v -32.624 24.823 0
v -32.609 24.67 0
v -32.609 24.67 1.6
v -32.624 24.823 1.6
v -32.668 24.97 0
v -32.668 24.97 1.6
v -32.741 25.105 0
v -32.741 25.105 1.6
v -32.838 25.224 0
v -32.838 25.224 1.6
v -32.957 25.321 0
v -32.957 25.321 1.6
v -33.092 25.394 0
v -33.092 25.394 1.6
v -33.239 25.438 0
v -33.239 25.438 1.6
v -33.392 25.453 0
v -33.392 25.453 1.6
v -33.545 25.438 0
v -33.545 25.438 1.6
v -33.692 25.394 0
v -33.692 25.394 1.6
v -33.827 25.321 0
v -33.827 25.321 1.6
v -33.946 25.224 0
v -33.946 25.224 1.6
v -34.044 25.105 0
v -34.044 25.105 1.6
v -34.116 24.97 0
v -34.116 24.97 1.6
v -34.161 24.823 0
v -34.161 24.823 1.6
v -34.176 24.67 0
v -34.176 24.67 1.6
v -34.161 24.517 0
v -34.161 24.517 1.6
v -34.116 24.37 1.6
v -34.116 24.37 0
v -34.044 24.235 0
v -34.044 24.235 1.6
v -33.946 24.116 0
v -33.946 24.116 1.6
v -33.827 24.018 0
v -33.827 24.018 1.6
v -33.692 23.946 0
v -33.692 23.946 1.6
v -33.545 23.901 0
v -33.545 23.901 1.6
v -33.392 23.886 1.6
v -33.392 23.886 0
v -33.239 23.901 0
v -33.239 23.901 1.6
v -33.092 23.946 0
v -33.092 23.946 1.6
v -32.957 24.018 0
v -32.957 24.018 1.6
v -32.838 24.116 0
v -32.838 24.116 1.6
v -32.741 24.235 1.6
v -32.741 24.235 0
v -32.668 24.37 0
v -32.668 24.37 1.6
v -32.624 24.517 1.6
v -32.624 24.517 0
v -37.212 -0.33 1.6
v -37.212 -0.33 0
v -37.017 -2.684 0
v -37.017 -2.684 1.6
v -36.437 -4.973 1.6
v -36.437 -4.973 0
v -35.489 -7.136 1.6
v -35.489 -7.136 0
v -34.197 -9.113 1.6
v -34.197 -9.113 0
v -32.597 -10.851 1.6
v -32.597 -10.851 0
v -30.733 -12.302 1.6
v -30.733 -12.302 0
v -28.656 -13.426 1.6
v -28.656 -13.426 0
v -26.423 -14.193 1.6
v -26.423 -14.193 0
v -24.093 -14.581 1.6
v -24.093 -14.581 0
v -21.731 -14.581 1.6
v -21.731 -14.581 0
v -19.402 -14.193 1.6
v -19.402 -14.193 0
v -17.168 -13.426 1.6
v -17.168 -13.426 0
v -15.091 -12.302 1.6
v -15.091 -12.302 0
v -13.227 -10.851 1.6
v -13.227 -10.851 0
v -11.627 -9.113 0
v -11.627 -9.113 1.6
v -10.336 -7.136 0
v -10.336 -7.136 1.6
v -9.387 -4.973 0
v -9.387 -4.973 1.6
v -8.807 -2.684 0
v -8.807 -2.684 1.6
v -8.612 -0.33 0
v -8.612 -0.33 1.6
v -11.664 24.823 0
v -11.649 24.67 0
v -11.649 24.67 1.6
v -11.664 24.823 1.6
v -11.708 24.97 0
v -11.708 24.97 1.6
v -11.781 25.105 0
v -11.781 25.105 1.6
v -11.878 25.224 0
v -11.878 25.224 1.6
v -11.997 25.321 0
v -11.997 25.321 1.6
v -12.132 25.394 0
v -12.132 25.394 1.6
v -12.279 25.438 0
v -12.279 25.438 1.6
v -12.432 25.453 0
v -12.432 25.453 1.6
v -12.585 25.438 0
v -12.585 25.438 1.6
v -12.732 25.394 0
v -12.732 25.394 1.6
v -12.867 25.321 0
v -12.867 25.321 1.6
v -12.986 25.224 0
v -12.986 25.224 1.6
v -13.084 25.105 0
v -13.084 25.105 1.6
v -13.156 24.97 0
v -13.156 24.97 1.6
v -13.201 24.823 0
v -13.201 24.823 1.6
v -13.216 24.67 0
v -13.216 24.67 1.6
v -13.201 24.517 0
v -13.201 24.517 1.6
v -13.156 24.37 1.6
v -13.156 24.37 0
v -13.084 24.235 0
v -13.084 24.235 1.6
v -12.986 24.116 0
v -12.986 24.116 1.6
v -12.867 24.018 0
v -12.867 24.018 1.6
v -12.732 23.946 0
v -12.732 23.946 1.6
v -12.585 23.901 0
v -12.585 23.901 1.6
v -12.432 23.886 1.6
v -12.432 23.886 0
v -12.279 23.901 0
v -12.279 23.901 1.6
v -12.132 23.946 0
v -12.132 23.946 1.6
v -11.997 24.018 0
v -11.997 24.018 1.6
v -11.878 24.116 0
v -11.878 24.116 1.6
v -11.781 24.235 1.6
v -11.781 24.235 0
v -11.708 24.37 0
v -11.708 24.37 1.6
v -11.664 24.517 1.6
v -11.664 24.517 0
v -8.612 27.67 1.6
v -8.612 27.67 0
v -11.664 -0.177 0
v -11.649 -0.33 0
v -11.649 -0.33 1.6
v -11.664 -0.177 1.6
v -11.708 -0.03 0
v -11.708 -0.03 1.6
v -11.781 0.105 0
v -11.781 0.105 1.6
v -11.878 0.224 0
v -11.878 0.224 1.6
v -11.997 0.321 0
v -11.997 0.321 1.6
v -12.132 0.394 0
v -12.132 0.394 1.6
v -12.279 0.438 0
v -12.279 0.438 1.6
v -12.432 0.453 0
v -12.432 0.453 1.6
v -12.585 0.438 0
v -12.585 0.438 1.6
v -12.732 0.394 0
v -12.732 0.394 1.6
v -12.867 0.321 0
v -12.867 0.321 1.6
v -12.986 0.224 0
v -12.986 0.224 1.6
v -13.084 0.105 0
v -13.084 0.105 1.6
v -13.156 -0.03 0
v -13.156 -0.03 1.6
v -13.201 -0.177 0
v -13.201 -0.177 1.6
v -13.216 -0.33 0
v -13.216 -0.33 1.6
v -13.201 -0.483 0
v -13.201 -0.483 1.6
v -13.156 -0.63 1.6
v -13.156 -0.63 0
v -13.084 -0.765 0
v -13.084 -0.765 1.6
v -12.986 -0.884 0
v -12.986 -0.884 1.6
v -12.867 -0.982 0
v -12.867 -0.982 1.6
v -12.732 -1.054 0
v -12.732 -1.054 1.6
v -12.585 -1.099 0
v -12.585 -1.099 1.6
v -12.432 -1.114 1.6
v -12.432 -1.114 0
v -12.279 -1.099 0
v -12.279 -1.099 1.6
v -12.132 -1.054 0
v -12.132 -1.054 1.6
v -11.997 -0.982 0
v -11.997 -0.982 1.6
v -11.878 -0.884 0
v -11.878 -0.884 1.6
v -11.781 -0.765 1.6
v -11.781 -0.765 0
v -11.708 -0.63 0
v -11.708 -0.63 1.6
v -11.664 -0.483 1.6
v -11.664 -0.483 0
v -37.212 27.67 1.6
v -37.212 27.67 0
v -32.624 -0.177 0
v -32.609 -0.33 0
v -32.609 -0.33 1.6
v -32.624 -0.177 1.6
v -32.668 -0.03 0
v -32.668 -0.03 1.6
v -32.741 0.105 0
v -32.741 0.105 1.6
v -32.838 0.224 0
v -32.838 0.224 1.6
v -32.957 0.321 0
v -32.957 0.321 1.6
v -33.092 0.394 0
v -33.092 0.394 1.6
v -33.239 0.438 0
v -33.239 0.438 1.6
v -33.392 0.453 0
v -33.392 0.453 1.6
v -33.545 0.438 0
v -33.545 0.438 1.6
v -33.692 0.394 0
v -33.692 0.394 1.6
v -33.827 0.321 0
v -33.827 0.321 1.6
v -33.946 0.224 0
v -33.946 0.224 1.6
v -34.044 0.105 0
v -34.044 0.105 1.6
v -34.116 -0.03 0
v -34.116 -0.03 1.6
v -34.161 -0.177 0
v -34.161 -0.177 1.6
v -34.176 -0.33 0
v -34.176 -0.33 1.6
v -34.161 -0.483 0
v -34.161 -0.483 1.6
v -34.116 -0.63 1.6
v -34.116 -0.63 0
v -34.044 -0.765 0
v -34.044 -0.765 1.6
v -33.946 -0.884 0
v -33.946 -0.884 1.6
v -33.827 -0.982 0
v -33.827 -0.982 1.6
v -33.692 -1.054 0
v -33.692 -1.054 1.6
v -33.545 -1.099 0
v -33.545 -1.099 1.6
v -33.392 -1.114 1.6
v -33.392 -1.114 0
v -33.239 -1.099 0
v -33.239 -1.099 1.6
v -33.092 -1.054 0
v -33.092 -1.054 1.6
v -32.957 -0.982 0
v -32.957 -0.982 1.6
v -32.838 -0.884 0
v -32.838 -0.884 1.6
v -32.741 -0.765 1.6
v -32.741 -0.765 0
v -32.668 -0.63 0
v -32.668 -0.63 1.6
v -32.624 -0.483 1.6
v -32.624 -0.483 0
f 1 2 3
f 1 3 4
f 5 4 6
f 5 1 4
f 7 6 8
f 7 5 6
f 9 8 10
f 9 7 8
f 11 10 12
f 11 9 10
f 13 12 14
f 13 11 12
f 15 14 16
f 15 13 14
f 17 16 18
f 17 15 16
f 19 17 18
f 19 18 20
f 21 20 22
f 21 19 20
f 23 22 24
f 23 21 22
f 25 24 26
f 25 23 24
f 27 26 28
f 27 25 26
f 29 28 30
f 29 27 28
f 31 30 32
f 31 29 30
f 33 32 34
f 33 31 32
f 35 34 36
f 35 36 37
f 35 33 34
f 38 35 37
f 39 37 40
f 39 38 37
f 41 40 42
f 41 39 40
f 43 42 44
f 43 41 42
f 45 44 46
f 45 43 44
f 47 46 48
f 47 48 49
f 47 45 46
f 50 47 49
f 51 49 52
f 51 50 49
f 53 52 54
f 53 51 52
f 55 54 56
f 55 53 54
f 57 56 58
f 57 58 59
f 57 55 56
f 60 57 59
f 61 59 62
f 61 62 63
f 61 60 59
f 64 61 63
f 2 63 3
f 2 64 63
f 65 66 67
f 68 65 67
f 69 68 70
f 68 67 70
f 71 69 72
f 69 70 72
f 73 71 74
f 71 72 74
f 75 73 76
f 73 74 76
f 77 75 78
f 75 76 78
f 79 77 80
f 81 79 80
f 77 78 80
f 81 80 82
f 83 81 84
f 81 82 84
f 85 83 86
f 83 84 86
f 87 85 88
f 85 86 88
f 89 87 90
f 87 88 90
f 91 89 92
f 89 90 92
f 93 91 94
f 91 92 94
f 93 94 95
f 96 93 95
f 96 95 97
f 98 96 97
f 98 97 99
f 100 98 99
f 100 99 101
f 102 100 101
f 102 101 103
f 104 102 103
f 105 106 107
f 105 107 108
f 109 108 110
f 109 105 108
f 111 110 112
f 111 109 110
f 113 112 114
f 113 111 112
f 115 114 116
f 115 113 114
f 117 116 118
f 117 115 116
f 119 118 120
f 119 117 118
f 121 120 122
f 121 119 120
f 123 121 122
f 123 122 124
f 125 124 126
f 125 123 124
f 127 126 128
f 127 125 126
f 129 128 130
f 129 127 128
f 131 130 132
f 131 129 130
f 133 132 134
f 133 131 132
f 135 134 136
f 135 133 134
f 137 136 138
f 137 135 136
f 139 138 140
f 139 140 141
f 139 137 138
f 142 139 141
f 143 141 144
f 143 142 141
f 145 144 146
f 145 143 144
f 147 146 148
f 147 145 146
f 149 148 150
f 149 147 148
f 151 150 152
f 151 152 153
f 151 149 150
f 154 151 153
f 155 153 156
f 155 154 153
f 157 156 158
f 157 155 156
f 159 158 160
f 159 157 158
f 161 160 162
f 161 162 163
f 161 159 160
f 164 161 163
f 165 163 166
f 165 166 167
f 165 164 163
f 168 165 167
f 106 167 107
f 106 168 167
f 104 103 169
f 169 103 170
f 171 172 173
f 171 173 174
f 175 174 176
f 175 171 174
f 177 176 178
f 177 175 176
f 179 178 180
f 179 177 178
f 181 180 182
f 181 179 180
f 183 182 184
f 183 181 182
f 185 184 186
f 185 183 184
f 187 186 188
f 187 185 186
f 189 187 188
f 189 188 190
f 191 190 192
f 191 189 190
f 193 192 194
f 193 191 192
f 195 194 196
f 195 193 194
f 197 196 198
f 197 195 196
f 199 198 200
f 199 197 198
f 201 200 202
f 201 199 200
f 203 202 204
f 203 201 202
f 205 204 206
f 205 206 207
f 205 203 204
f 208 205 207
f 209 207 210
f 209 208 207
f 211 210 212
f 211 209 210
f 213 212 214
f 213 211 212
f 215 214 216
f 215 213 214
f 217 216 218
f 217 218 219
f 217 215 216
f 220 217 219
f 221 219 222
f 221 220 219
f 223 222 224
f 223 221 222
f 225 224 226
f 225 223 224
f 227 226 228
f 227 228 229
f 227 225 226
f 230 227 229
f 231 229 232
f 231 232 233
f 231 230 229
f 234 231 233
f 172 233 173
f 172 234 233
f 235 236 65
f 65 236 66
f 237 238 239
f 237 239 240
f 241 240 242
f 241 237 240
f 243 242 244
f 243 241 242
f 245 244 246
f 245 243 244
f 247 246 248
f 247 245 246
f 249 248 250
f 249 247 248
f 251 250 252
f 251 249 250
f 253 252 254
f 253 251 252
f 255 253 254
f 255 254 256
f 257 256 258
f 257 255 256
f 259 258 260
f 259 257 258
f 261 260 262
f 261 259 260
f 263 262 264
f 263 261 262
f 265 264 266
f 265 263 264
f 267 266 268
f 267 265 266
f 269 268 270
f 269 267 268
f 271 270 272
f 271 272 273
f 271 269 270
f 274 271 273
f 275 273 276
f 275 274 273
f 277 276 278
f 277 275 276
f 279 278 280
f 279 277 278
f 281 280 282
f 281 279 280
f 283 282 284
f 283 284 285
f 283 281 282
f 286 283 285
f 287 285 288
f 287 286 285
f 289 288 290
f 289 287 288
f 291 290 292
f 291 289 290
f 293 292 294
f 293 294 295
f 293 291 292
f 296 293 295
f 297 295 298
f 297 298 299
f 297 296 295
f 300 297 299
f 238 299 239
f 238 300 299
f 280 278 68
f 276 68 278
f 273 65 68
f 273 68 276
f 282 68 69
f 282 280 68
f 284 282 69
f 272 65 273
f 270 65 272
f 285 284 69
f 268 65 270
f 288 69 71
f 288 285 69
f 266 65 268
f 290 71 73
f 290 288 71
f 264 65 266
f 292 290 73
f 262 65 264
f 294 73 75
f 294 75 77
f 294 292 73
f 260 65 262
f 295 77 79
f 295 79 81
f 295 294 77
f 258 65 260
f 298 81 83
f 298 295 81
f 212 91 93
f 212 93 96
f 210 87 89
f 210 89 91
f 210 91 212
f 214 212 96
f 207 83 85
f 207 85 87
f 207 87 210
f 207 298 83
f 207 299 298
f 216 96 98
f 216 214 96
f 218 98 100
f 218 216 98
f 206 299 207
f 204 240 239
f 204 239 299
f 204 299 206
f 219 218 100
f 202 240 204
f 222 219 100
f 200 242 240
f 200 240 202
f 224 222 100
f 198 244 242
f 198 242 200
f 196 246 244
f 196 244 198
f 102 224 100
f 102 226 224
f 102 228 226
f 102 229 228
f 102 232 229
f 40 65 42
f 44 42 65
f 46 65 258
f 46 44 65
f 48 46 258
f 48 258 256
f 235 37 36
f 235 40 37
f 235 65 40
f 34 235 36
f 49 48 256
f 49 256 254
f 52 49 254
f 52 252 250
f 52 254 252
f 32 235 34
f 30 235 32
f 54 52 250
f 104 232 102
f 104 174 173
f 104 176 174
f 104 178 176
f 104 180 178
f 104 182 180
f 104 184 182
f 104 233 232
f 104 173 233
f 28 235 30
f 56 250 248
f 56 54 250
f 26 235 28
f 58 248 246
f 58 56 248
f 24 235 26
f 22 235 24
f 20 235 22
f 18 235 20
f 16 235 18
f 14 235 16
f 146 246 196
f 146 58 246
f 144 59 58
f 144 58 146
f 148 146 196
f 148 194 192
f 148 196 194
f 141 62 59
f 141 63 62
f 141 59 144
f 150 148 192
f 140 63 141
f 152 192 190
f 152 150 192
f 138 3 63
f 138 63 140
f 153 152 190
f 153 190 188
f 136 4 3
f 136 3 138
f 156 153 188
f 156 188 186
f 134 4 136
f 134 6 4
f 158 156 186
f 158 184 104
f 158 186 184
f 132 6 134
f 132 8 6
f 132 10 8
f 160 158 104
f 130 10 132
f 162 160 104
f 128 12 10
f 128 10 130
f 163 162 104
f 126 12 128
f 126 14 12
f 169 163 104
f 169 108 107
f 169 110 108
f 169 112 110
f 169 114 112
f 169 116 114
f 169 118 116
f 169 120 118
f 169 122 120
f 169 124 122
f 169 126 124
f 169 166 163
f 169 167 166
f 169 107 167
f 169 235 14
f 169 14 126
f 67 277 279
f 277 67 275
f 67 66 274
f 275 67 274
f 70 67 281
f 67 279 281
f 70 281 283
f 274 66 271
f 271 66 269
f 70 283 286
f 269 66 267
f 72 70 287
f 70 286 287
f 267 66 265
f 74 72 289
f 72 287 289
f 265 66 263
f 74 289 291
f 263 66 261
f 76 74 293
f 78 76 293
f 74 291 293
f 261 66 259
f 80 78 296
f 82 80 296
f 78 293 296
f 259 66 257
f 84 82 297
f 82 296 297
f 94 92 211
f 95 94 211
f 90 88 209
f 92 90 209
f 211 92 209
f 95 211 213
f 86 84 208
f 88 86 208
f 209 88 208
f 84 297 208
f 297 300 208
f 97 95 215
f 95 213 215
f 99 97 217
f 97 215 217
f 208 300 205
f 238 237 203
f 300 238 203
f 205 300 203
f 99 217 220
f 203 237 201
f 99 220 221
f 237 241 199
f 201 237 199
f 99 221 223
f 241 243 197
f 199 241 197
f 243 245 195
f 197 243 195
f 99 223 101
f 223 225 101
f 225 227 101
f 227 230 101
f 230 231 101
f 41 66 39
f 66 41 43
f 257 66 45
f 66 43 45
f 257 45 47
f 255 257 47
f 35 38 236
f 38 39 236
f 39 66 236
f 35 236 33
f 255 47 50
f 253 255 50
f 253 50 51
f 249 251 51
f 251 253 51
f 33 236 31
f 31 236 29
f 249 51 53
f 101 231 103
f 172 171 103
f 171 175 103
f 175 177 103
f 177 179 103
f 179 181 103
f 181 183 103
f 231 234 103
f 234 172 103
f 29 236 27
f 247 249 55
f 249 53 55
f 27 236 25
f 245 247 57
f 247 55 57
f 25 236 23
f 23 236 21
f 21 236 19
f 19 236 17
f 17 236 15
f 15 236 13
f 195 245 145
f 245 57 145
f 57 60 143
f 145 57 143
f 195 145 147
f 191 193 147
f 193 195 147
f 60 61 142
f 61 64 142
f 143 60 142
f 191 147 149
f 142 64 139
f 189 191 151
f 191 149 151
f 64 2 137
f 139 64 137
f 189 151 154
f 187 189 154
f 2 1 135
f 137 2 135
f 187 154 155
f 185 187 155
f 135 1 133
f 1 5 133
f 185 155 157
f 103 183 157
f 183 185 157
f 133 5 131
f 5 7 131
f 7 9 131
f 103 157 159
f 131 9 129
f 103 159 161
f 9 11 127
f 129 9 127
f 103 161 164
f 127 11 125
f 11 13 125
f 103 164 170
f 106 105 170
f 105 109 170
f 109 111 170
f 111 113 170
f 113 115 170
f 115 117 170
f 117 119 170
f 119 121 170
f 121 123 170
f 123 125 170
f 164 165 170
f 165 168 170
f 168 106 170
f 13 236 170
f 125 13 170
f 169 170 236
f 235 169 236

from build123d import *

# Parameters (mm, degrees)
MODEL_R             = 0.7834936
MODEL_R_2           = 6.5
MODEL_W             = 10.5
MODEL_H             = 3
MODEL_H_2           = 4
MODEL_R_3           = 1.229367
EXTRUDE_8_DEPTH     = 1.6
CUT_EXTRUDE_1_DEPTH = 10


with BuildPart() as part:
    # Model → 凸台-拉伸8 (new body)
    with BuildSketch(Plane.XY):
        with BuildLine():
            Line((-28.162112801, 27.669809042), (-37.212112801, 27.669809042))
            Line((-37.212112801, 27.669809042), (-37.212112801, -0.330212606))
            ThreePointArc((-37.212112801, -0.330212606), (-22.912101977, -14.630201782), (-8.612112801, -0.330190958))
            Line((-8.612112801, -0.330190958), (-8.612112801, 27.669809042))
            Line((-8.612112801, 27.669809042), (-17.662112801, 27.669809042))
            Line((-17.662112801, 27.669809042), (-17.662112801, 24.669809042))
            Line((-17.662112801, 24.669809042), (-16.932112801, 24.669809042))
            ThreePointArc((-16.932112801, 24.669809042), (-15.87145263, 24.230469214), (-15.432112801, 23.169809042))
            Line((-15.432112801, 23.169809042), (-15.432112801, -0.330190958))
            ThreePointArc((-15.432112801, -0.330190958), (-22.912112801, -7.810190958), (-30.392112801, -0.330190958))
            Line((-30.392112801, -0.330190958), (-30.392112801, 23.169809042))
            ThreePointArc((-30.392112801, 23.169809042), (-29.952772973, 24.230469214), (-28.892112801, 24.669809042))
            Line((-28.892112801, 24.669809042), (-28.162112801, 24.669809042))
            Line((-28.162112801, 24.669809042), (-28.162112801, 27.669809042))
        make_face()
        with Locations((-33.392112801, -0.330190958)):
            Circle(MODEL_R, mode=Mode.SUBTRACT)
        with Locations((-12.432112801, -0.330190958)):
            Circle(MODEL_R, mode=Mode.SUBTRACT)
        with Locations((-33.392112801, 24.669809042)):
            Circle(MODEL_R, mode=Mode.SUBTRACT)
        with Locations((-12.432112801, 24.669809042)):
            Circle(MODEL_R, mode=Mode.SUBTRACT)
        with BuildLine():
            Line((-30.392112801, -0.330190958), (-30.392112801, 23.169809042))
            ThreePointArc((-30.392112801, 23.169809042), (-29.952772973, 24.230469214), (-28.892112801, 24.669809042))
            Line((-28.892112801, 24.669809042), (-16.932112801, 24.669809042))
            ThreePointArc((-16.932112801, 24.669809042), (-15.87145263, 24.230469214), (-15.432112801, 23.169809042))
            Line((-15.432112801, 23.169809042), (-15.432112801, -0.330190958))
            ThreePointArc((-15.432112801, -0.330190958), (-22.912112801, -7.810190958), (-30.392112801, -0.330190958))
        make_face()
        with Locations((-22.912112801, -0.330190958)):
            Circle(MODEL_R_2, mode=Mode.SUBTRACT)
        with Locations((-22.912112801, 26.169809042)):
            Rectangle(MODEL_W, MODEL_H)
        with Locations((-22.912112801, 29.669809042)):
            Rectangle(MODEL_W, MODEL_H_2)
        with Locations((-22.912112801, 29.669809042)):
            Circle(MODEL_R_3, mode=Mode.SUBTRACT)
        with Locations((-22.912112801, 29.669809042)):
            Circle(MODEL_R_3)
        with Locations((-22.912112801, -0.330190958)):
            Circle(MODEL_R_2)
    extrude(amount=EXTRUDE_8_DEPTH)

    # 草图1 → 切除-拉伸1 (cut)
    with BuildSketch(Plane.XY.offset(1.6)):
        Polygon((-28.162112801, 27.669809042), (-17.662112801, 27.669809042), (-17.662112801, 34.986019155), (-28.743542957, 34.986019155), align=None)
    extrude(amount=-CUT_EXTRUDE_1_DEPTH, mode=Mode.SUBTRACT)


solid = part.part
